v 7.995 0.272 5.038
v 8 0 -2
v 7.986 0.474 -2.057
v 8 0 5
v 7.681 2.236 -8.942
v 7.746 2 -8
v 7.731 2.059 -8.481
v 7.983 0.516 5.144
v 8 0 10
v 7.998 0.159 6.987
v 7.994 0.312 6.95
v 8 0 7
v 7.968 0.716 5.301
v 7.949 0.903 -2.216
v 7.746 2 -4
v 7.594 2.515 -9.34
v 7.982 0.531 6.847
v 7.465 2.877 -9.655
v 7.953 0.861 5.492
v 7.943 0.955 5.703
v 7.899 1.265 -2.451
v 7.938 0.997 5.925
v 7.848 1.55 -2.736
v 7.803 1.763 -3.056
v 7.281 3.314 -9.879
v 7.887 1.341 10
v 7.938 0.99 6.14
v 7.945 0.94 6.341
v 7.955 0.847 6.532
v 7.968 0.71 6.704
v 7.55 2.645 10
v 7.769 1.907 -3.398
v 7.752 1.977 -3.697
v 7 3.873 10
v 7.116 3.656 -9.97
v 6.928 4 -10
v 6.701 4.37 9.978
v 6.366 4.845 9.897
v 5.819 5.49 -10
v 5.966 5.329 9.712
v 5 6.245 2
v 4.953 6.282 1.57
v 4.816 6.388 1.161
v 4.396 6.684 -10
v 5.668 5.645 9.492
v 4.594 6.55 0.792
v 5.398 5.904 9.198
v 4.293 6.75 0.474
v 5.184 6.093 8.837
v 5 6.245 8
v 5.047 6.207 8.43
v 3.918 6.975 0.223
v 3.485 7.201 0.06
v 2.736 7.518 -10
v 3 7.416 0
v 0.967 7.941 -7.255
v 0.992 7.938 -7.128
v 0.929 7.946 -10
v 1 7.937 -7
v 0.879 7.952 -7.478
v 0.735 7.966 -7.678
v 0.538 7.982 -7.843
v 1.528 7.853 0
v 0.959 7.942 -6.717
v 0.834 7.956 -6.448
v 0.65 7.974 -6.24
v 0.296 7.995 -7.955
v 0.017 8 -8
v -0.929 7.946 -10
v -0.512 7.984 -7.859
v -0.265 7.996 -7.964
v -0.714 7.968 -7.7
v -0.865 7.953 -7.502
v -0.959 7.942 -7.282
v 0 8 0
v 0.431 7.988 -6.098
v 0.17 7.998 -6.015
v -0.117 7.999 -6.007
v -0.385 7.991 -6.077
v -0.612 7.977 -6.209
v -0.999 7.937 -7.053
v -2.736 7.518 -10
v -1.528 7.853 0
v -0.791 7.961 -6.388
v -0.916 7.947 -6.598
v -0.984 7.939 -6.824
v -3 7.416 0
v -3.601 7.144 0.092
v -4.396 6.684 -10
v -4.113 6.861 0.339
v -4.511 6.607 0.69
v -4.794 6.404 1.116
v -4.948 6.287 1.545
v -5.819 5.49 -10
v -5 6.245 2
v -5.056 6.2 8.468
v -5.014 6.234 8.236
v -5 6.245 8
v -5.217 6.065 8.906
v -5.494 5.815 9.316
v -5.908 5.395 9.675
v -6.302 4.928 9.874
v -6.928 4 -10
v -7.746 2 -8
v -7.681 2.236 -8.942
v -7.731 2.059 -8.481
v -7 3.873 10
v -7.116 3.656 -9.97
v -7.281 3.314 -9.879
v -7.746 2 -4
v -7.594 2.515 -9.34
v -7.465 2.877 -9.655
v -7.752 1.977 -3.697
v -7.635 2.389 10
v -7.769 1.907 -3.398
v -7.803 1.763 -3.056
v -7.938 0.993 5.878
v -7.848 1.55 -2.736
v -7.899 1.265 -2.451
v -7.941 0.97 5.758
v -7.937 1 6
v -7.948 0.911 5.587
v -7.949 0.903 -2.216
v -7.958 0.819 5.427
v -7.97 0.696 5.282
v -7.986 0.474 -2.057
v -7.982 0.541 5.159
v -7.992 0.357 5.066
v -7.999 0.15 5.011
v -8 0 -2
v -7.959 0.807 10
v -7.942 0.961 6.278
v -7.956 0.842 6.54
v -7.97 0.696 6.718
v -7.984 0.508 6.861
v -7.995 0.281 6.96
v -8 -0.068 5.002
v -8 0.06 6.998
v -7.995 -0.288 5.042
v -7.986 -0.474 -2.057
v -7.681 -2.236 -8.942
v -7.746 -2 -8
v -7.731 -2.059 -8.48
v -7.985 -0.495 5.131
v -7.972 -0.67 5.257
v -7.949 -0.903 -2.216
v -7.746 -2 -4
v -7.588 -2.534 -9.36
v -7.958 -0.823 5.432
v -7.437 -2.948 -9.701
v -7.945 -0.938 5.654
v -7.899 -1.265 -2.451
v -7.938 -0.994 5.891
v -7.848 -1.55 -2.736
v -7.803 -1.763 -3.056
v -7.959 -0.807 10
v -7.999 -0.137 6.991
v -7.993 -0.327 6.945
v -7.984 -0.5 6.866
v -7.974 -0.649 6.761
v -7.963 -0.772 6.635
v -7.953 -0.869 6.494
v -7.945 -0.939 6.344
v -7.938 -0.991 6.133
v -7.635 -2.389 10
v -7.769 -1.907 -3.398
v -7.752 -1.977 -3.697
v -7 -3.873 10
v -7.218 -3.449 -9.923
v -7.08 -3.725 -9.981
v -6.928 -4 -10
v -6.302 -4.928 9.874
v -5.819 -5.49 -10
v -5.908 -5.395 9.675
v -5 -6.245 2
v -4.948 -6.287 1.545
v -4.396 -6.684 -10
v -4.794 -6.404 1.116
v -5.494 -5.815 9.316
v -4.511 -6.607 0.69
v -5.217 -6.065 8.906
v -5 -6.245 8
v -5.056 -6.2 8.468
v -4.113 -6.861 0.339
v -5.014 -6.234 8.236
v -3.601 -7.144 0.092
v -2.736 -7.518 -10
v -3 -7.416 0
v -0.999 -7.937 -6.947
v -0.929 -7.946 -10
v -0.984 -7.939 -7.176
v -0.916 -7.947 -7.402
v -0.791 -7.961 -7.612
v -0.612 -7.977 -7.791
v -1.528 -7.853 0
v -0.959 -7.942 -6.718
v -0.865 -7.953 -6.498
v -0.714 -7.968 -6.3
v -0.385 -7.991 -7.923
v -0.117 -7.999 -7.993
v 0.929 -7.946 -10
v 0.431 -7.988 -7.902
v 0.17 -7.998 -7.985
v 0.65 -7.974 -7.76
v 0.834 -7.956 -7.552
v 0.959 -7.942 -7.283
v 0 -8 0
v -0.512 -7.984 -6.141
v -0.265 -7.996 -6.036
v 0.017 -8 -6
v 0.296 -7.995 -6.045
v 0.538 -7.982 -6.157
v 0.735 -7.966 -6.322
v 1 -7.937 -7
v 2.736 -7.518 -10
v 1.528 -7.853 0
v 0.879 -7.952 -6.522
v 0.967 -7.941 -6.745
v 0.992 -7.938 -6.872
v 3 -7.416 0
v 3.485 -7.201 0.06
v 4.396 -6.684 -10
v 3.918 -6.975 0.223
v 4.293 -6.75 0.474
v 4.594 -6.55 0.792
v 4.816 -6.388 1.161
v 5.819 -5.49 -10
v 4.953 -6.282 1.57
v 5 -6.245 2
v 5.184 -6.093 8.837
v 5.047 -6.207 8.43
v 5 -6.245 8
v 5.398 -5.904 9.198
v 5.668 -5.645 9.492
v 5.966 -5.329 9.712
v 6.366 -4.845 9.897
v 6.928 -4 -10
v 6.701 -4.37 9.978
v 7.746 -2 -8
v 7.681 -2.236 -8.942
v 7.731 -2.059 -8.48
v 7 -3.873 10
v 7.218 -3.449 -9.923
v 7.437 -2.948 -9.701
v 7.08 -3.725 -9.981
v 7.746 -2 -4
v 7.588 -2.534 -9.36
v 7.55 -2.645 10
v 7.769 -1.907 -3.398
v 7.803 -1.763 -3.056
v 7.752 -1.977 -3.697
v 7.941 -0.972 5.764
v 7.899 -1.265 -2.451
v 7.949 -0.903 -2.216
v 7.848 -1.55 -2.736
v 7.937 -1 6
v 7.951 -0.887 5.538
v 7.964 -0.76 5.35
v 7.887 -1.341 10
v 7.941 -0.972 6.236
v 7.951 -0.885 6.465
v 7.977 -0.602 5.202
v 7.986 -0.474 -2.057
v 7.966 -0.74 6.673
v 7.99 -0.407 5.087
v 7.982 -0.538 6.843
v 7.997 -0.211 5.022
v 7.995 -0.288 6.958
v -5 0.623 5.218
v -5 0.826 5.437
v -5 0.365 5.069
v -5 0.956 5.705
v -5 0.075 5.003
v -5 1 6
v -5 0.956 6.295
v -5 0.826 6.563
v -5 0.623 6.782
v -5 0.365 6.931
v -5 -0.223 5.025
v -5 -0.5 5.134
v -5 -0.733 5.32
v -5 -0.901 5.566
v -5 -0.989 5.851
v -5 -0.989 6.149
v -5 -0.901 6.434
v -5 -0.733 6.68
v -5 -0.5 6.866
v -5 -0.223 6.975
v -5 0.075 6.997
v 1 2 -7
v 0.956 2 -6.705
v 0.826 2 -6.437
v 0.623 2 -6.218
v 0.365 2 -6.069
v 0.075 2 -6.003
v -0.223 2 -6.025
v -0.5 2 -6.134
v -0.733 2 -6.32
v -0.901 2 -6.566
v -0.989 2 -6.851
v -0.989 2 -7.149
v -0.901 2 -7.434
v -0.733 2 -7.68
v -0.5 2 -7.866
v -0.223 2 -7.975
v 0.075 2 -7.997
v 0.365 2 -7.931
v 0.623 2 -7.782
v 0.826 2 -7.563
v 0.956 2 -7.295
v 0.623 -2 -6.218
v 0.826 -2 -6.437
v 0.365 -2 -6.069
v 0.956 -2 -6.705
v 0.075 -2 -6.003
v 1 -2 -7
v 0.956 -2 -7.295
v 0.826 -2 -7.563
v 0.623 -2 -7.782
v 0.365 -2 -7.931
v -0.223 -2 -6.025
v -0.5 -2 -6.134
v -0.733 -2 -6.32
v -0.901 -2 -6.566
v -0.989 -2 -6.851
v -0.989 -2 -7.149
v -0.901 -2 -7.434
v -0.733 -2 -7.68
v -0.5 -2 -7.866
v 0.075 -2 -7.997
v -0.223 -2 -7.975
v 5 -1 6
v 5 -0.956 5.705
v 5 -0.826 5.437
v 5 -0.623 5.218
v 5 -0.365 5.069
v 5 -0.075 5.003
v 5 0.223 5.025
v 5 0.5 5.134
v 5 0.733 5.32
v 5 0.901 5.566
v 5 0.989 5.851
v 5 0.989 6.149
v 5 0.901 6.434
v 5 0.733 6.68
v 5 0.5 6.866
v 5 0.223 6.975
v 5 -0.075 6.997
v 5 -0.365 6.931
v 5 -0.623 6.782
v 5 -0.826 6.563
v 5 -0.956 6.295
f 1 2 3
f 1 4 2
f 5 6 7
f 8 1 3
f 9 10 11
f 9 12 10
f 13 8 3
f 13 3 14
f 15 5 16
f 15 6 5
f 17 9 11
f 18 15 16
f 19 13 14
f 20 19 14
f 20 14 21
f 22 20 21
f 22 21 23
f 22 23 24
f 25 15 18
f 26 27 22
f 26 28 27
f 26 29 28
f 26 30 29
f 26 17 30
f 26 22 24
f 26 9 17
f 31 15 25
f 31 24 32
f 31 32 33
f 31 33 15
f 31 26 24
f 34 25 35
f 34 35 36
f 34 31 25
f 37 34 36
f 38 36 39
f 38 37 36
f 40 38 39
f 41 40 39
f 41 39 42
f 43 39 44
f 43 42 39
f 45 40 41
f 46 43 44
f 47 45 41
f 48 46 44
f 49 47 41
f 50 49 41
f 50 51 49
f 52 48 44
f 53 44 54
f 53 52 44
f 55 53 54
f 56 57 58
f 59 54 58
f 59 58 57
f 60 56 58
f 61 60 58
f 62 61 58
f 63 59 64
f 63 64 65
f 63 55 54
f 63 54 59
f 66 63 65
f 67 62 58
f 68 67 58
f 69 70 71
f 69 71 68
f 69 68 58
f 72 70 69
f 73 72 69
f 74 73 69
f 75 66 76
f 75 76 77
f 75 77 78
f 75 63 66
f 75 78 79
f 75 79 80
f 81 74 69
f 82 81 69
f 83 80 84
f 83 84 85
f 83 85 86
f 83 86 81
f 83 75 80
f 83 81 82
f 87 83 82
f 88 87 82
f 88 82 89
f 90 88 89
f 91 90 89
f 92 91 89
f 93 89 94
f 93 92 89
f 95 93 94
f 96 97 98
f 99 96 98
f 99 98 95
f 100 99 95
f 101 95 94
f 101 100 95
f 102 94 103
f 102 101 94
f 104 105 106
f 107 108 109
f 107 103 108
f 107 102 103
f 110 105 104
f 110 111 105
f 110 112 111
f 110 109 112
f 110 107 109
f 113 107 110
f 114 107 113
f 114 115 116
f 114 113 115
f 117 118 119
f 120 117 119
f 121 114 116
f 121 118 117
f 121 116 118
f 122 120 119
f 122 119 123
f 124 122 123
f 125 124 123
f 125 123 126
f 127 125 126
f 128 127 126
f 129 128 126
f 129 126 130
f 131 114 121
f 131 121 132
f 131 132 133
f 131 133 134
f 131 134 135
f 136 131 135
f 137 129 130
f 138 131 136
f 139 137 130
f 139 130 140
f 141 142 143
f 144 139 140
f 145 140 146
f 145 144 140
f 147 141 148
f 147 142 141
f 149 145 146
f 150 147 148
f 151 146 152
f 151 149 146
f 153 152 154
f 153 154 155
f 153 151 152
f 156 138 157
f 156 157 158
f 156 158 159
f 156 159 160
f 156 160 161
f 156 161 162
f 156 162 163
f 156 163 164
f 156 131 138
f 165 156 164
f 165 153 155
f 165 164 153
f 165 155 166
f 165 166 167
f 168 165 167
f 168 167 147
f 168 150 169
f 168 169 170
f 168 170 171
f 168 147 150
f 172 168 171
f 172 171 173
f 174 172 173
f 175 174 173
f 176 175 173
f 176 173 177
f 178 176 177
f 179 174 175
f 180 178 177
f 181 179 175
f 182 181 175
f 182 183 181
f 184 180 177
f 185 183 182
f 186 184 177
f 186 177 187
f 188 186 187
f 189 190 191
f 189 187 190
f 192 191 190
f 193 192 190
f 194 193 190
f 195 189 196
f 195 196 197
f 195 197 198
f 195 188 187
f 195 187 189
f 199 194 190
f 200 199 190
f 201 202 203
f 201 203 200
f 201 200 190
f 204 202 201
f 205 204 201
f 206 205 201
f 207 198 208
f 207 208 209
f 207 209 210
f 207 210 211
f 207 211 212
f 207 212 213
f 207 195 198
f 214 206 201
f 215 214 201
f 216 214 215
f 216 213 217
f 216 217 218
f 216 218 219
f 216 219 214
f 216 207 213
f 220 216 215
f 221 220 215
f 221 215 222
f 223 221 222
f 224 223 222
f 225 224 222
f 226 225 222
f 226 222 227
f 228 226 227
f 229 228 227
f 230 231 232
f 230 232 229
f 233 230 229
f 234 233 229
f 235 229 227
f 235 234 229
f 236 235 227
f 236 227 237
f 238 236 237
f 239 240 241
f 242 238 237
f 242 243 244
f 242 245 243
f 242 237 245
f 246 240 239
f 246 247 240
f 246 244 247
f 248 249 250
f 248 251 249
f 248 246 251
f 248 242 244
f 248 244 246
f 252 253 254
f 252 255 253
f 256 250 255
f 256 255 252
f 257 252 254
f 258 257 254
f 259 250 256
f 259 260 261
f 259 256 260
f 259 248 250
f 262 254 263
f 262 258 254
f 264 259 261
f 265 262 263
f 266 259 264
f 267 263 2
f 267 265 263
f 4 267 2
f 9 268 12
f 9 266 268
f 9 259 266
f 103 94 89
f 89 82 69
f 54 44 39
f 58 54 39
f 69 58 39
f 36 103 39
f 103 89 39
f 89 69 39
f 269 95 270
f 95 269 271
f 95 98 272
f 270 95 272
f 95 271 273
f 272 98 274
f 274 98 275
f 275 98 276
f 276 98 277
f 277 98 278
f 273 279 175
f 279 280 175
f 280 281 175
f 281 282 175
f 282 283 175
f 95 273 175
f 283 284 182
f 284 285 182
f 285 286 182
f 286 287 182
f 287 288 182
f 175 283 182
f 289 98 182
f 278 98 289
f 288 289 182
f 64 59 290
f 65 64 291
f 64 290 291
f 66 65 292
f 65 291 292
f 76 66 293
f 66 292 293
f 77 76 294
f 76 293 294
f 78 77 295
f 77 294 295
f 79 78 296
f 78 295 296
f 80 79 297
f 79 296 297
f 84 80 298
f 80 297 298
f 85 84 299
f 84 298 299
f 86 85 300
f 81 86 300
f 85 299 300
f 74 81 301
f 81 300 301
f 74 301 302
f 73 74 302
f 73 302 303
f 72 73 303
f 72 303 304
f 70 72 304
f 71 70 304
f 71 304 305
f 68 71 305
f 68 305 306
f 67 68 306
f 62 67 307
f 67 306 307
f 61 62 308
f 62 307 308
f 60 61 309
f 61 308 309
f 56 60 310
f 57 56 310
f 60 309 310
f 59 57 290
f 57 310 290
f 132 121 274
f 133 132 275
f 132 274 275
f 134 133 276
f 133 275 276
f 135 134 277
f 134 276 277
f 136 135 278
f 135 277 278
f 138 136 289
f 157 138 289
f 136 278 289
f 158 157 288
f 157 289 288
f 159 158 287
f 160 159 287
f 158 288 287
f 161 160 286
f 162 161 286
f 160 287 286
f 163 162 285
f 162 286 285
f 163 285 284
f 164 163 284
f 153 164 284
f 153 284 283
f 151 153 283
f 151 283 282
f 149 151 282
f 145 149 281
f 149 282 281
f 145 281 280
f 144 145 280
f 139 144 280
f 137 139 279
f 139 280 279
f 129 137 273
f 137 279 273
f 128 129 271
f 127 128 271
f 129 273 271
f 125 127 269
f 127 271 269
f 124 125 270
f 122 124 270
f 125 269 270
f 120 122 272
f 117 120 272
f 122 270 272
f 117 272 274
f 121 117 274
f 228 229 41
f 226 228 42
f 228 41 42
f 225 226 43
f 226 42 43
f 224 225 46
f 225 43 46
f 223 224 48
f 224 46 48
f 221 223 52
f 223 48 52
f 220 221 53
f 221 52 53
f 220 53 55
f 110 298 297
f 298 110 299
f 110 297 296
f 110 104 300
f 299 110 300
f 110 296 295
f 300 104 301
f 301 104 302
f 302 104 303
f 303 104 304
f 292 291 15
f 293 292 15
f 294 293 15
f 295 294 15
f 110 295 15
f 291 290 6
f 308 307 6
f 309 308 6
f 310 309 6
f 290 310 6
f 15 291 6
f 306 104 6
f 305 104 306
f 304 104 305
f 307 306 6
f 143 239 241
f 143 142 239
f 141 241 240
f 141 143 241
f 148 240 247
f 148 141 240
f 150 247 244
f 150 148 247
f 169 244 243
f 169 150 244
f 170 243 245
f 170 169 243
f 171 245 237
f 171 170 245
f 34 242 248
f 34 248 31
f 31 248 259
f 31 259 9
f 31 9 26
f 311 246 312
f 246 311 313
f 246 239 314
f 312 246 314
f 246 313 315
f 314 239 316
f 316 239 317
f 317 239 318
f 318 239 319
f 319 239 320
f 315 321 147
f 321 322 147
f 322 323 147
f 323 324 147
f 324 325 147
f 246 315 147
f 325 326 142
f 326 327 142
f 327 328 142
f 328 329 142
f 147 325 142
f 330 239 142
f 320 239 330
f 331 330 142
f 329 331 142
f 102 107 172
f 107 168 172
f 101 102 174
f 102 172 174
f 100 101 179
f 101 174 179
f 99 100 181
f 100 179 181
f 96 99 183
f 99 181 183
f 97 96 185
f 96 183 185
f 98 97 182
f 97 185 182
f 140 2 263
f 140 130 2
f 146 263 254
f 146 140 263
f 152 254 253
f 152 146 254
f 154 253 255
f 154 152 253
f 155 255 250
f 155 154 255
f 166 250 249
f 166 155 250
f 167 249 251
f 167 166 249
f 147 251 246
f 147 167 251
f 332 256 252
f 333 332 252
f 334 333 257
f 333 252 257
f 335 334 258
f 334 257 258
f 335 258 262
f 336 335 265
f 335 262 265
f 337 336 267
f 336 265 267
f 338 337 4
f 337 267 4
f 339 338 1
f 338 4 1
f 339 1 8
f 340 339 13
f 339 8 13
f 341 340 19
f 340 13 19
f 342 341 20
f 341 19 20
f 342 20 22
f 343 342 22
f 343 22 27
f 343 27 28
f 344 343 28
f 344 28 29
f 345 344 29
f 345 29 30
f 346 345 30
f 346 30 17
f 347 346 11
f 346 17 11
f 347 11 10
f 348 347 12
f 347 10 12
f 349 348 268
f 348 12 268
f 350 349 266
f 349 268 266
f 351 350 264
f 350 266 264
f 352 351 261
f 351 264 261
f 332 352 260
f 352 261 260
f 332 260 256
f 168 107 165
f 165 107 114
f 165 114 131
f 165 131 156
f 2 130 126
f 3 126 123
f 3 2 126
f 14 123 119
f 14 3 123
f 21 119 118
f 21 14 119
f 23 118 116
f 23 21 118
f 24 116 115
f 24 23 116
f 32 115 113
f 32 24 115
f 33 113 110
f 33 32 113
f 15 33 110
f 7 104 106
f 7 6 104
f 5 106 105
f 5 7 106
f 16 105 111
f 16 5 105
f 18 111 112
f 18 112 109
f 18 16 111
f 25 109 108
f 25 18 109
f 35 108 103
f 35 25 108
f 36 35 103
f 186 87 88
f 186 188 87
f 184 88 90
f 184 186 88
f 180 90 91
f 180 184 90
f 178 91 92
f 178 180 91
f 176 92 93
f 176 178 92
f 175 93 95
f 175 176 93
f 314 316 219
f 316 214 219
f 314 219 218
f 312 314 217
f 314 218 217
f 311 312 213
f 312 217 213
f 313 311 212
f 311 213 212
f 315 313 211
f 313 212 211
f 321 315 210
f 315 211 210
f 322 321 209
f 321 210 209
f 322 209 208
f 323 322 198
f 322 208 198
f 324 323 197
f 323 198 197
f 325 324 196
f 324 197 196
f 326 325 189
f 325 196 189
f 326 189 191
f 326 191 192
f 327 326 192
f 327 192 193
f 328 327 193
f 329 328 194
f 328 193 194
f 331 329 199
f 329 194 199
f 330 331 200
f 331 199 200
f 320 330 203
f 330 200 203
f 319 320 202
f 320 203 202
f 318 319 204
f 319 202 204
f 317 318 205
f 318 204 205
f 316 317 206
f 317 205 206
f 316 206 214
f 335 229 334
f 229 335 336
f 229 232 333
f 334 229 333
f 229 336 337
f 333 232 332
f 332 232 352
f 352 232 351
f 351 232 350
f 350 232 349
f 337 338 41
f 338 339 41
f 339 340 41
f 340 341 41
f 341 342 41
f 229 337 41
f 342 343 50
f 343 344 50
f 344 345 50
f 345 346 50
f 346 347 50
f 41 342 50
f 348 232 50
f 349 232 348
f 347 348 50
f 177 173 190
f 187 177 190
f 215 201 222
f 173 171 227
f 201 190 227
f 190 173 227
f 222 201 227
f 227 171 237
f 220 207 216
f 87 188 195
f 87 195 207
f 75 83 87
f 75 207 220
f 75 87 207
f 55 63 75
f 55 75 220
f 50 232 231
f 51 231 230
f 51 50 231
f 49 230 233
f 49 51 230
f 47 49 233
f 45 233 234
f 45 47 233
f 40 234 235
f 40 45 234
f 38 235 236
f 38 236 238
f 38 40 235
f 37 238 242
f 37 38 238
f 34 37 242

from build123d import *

# Parameters (mm, degrees)
F0_R      = 8
F1_DEPTH  = 10
F3_DEPTH  = 10
F5_D      = 2
F5_DEPTH  = 8.001
F6_D      = 2
F7_R      = 2
F9_DEPTH  = 8
F10_R     = 1.9999
F11_R     = 1
F12_DEPTH = 8


# Not quite as in the source:
# - a fillet or chamfer is up to 0.001 mm smaller than in the source, because OpenCascade refuses the exact size
# - a feature names something its author has since deleted; it is built from what else it names


with BuildPart() as f1:
    # F0 (on Top) → F1 (new body, symmetric)
    with BuildSketch(Plane.XY):
        Circle(F0_R)
    extrude(amount=F1_DEPTH, both=True)

    # F2 (on face) → F3 (cut)
    with BuildSketch(Plane.XY.offset(10)):
        with BuildLine():
            ThreePointArc((5, 6.2449979984), (0, 8), (-5, 6.2449979984))
            Line((-5, 6.2449979984), (-5, -6.2449979984))
            ThreePointArc((-5, -6.2449979984), (0, -8), (5, -6.2449979984))
            Line((5, -6.2449979984), (5, 6.2449979984))
        make_face()
    extrude(amount=-F3_DEPTH, mode=Mode.SUBTRACT)

    # F5 (through all, one way)
    with BuildSketch(Plane.YZ):
        with Locations((0, 6)):
            Circle(F5_D / 2)
    extrude(amount=-F5_DEPTH, mode=Mode.SUBTRACT)

    # F6 (through all)
    with Locations(Plane(origin=(0, 0, 0), x_dir=(0, 1, 0), z_dir=(-1, 0, 0))):
        with Locations((0, -6)):
            Hole(F6_D / 2)

    # F7
    f7_edges = [f1.edges().sort_by_distance(p)[0] for p in [
        (5, 0, 10),
        (-5, 0, 10),
    ]]
    fillet(f7_edges, radius=F7_R)

    # F8 (on face) → F9 (cut)
    with BuildSketch(Plane(origin=(0, 0, -10), x_dir=(1, 0, 0), z_dir=(0, 0, -1))):
        with BuildLine():
            Line((7.7459666924, 2), (-7.7459666924, 2))
            ThreePointArc((-7.7459666924, 2), (-8, 0), (-7.7459666924, -2))
            Line((-7.7459666924, -2), (7.7459666924, -2))
            ThreePointArc((7.7459666924, -2), (7.9362375701, -1.0080343399), (8, 0))
            ThreePointArc((8, 0), (7.9362375701, 1.0080343399), (7.7459666924, 2))
        make_face()
    extrude(amount=-F9_DEPTH, mode=Mode.SUBTRACT)

    # F10 (radius 2 in the source; OpenCascade refuses exactly that, so slightly less here)
    f10_edges = [f1.edges().sort_by_distance(p)[0] for p in [
        (0, 2, -10),
        (0, -2, -10),
        (0, -2, -2),
        (0, 2, -2),
        (-5, 0, 0),
        (5, 0, 0),
    ]]
    fillet(f10_edges, radius=F10_R)

    # F11 (on Front) → F12 (cut, symmetric)
    with BuildSketch(Plane.XZ):
        with Locations((0, -7)):
            Circle(F11_R)
    extrude(amount=F12_DEPTH, both=True, mode=Mode.SUBTRACT)


solid = f1.part
